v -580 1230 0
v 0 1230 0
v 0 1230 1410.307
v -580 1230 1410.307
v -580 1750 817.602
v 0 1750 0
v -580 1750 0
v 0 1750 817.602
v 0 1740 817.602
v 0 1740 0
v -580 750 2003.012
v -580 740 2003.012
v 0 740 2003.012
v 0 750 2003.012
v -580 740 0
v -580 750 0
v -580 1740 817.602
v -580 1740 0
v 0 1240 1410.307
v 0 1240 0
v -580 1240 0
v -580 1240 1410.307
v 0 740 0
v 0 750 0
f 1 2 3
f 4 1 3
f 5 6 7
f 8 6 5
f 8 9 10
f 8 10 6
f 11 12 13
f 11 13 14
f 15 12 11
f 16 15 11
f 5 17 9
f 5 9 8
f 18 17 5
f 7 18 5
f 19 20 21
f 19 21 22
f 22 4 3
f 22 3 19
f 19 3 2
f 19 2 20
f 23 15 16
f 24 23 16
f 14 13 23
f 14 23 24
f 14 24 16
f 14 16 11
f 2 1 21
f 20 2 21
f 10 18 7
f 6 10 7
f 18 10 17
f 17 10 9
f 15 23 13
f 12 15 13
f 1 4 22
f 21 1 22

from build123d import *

# Parameters (mm, degrees)
F2_W     = 10
F2_H     = 2003.011991
F2_H_2   = 1410.306824
F2_H_3   = 817.601657
F3_DEPTH = 580


with BuildPart() as f3:
    # F2 (on Right) → F3 (new body)
    with BuildSketch(Plane.YZ):
        with Locations((745, 1001.505995)):
            Rectangle(F2_W, F2_H)
        with Locations((1235, 705.153412)):
            Rectangle(F2_W, F2_H_2)
        with Locations((1745, 408.800828)):
            Rectangle(F2_W, F2_H_3)
    extrude(amount=-F3_DEPTH)


solid = f3.part
